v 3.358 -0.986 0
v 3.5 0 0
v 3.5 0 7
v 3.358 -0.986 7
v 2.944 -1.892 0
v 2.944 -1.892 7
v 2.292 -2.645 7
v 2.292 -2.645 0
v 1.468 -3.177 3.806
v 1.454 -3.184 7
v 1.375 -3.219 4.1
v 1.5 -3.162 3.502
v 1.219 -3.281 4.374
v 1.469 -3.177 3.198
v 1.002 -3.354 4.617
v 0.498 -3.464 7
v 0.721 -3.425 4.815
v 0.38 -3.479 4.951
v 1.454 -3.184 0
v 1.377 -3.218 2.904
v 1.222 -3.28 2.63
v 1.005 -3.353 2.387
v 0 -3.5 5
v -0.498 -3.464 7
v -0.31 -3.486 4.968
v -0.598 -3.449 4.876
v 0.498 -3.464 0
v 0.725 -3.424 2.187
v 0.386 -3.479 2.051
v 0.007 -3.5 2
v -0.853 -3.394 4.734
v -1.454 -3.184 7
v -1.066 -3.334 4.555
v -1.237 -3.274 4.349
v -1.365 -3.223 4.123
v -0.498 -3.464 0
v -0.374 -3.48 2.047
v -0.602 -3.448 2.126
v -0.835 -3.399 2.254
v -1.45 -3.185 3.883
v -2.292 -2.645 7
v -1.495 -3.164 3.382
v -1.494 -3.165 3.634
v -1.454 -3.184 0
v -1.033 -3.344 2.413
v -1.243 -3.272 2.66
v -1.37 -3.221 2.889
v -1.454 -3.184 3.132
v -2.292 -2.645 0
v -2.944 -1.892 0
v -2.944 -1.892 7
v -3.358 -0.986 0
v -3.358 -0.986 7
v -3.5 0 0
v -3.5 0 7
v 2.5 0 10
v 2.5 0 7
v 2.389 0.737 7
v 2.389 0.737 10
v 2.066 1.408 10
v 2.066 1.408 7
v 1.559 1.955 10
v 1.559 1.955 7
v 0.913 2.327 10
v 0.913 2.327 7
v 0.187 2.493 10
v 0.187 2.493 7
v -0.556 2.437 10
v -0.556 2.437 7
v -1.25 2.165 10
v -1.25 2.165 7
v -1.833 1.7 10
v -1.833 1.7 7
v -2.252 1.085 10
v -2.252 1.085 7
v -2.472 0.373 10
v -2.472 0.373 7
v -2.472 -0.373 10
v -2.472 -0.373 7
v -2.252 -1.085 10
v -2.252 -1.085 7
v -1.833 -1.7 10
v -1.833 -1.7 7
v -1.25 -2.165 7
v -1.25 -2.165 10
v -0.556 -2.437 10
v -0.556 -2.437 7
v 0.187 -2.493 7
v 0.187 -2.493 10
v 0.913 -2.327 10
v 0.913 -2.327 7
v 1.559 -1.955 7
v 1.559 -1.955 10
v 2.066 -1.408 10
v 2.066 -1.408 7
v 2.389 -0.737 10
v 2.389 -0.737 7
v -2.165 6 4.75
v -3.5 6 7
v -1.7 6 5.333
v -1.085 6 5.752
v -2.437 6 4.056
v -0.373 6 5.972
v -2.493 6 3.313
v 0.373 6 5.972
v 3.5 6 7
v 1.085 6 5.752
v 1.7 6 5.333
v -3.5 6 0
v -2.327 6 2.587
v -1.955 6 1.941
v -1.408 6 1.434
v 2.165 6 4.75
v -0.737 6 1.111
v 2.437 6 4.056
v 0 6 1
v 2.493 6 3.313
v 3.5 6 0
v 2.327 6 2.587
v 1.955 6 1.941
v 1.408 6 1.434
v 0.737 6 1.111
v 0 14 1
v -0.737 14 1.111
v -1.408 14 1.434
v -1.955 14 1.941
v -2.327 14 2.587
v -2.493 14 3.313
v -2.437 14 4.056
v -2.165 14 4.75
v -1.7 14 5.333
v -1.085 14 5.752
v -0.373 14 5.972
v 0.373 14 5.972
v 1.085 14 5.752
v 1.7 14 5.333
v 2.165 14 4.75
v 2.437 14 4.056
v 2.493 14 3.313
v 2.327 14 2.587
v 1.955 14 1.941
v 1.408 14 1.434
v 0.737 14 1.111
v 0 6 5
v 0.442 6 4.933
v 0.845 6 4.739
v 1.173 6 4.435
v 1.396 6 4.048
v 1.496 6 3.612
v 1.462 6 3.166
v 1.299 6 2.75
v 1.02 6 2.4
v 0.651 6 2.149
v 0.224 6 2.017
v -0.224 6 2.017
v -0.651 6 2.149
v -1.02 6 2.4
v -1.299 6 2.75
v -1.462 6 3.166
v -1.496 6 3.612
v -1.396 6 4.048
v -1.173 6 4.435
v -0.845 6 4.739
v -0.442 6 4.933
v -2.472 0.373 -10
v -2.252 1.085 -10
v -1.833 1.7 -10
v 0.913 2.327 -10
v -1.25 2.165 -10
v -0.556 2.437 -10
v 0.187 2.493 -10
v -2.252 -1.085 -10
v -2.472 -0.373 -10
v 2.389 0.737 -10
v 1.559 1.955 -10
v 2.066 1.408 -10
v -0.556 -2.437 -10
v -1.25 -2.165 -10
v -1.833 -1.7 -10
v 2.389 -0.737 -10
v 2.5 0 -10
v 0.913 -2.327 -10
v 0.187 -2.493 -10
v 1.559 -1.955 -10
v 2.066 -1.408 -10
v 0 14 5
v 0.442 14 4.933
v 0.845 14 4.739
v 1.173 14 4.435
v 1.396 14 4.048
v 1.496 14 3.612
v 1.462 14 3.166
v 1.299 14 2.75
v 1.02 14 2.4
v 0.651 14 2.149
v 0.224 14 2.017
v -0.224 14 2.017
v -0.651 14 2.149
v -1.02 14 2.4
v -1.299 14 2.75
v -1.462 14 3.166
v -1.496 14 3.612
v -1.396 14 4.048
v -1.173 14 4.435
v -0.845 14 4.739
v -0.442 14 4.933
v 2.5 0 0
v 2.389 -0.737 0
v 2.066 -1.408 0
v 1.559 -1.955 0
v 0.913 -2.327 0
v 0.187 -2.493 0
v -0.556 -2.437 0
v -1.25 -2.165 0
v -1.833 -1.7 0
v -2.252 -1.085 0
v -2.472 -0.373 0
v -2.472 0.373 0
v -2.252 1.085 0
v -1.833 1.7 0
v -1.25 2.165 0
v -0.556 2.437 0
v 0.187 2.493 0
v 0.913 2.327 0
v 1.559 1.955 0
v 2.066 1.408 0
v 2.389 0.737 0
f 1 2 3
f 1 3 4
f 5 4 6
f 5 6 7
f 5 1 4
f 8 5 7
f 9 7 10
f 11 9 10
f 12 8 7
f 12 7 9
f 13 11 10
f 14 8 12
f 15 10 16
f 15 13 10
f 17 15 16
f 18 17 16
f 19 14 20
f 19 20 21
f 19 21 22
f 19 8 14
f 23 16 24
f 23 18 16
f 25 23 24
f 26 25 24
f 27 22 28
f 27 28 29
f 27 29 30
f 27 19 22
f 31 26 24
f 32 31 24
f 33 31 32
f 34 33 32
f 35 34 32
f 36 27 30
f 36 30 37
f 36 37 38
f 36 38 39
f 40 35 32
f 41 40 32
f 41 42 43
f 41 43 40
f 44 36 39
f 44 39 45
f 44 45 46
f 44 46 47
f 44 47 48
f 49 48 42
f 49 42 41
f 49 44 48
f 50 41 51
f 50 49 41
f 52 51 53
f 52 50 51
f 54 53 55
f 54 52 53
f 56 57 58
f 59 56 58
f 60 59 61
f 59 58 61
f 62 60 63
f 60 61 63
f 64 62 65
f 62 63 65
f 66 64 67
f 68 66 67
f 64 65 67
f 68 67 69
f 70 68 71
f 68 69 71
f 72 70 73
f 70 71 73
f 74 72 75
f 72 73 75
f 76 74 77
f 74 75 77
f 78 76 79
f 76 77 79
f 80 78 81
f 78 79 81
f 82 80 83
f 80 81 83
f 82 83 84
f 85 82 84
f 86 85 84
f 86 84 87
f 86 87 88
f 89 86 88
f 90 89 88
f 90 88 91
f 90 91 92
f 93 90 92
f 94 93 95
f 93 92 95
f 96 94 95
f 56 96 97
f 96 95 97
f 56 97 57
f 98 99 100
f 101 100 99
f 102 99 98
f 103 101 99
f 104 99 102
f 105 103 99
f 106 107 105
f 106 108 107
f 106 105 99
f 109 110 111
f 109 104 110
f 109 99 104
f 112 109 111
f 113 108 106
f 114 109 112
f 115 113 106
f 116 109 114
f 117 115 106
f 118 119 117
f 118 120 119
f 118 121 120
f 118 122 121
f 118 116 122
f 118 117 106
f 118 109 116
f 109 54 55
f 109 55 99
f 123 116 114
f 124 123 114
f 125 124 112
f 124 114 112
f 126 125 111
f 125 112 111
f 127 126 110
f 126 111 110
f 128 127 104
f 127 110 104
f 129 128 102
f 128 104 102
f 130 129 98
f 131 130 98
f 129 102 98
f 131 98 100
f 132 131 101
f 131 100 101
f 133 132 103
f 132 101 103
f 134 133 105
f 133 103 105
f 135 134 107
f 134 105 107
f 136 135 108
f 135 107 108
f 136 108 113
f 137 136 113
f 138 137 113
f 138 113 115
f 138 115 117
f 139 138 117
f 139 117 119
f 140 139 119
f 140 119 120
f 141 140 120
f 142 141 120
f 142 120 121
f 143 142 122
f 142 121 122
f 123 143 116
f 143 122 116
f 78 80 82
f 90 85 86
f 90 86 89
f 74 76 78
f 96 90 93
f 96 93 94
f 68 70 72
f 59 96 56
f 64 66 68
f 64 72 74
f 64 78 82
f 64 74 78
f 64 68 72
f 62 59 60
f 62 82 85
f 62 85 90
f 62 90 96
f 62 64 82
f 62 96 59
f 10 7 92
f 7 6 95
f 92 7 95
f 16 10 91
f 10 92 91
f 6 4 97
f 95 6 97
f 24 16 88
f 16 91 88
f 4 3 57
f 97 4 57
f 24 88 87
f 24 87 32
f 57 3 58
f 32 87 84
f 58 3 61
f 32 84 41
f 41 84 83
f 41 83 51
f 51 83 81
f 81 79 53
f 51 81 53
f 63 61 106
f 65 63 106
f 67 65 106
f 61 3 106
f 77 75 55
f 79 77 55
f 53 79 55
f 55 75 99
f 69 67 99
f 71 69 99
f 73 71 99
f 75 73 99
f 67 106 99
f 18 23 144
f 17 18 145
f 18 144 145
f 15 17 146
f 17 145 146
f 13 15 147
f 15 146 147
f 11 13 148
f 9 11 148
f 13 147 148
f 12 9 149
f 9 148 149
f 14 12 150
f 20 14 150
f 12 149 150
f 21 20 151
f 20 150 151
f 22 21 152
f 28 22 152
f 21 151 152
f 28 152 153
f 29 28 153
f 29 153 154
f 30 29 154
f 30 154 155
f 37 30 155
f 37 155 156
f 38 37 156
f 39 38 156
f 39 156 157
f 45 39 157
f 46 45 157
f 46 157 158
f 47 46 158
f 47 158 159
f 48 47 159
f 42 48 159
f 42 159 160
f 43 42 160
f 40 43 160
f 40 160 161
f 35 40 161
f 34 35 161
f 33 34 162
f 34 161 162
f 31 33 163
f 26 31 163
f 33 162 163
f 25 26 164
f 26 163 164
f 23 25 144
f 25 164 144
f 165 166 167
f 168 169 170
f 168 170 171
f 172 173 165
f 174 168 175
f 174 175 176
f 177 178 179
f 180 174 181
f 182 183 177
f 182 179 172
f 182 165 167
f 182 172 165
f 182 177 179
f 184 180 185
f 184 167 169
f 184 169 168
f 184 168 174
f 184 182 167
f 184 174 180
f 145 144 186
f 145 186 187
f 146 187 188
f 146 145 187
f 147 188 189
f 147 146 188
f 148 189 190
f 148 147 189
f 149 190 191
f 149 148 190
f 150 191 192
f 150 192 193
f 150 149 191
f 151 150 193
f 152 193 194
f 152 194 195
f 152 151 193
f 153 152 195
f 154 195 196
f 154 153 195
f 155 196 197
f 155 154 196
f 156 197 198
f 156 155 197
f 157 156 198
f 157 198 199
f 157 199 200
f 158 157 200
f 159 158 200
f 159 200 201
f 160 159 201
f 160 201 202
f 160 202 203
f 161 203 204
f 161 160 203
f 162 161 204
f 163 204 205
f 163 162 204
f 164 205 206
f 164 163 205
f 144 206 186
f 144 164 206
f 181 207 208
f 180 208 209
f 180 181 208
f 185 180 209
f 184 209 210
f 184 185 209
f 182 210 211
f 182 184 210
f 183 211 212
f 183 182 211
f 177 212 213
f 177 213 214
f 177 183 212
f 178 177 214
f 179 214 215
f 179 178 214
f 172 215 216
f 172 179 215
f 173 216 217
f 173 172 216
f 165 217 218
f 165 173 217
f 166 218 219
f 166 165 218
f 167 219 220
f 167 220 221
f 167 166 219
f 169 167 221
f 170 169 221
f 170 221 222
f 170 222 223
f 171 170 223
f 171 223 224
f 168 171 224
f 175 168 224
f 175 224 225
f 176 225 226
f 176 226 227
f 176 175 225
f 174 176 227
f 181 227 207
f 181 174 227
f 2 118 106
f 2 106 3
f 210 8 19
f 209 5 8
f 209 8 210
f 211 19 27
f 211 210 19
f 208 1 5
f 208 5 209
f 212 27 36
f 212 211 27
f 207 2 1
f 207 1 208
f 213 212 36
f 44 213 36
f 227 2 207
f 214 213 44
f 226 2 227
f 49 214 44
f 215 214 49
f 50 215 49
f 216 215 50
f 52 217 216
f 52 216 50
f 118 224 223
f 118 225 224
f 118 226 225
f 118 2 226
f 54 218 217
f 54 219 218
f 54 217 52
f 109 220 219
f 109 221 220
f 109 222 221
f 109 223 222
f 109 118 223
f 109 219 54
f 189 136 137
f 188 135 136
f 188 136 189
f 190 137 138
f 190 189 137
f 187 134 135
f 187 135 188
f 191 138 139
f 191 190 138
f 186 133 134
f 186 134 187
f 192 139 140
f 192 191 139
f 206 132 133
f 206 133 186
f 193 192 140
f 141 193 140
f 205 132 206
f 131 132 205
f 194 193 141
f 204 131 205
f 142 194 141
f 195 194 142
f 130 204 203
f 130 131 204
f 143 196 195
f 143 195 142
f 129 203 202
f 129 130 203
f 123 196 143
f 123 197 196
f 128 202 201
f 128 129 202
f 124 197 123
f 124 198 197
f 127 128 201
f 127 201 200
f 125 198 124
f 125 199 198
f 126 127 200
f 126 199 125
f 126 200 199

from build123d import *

# Parameters (mm, degrees)
EXTRUDE_1_DEPTH     = 7
SKETCH_3_R          = 2.5
EXTRUDE_2_DEPTH     = 3
EXTRUDE_START       = 10
SKETCH_4_R          = 2.5
EXTRUDE_3_DEPTH     = 10
SKETCH_5_R          = 2.5
SKETCH_5_R_2        = 1.5
EXTRUDE_5_DEPTH     = 8
SKETCH_6_R          = 1.5
CUT_EXTRUDE_6_DEPTH = 15.230249471


with BuildPart() as part:
    # 草圖1 → 伸長1 (new body)
    with BuildSketch(Plane.XY):
        with BuildLine():
            Line((-3.5, 0), (-3.5, 6))
            Line((-3.5, 6), (3.5, 6))
            Line((3.5, 6), (3.5, 0))
            ThreePointArc((3.5, 0), (0, -3.5), (-3.5, 0))
        make_face()
    extrude(amount=EXTRUDE_1_DEPTH)

    # 草圖3 → 伸長2 (add)
    with BuildSketch(Plane.XY.offset(7)):
        Circle(SKETCH_3_R)
    extrude(amount=EXTRUDE_2_DEPTH)

    # 草圖4 → 伸長3 (add)
    with BuildSketch(Plane(origin=(0, 0, 0), x_dir=(-1, 0, 0), z_dir=(0, 0, -1)).offset(EXTRUDE_START)):
        with Locations(Location((0, 0, 0), (0, 0, 180))):
            Circle(SKETCH_4_R)
    extrude(amount=-EXTRUDE_3_DEPTH)

    # 草圖5 → 伸長5 (add)
    with BuildSketch(Plane(origin=(0, 6, 0), x_dir=(1, 0, 0), z_dir=(0, 1, 0))):
        with Locations(Location((0, -3.5, 0), (0, 0, 90))):
            Circle(SKETCH_5_R)
        with Locations(Location((0, -3.5, 0), (0, 0, 270))):
            Circle(SKETCH_5_R_2, mode=Mode.SUBTRACT)
    extrude(amount=EXTRUDE_5_DEPTH)

    # 草圖6 → 伸長6 (cut, through all)
    with BuildSketch(Plane(origin=(0, 6, 0), x_dir=(1, 0, 0), z_dir=(0, 1, 0))):
        with Locations(Location((0, -3.5, 0), (0, 0, 270))):
            Circle(SKETCH_6_R)
    extrude(amount=-CUT_EXTRUDE_6_DEPTH, mode=Mode.SUBTRACT)


solid = part.part
